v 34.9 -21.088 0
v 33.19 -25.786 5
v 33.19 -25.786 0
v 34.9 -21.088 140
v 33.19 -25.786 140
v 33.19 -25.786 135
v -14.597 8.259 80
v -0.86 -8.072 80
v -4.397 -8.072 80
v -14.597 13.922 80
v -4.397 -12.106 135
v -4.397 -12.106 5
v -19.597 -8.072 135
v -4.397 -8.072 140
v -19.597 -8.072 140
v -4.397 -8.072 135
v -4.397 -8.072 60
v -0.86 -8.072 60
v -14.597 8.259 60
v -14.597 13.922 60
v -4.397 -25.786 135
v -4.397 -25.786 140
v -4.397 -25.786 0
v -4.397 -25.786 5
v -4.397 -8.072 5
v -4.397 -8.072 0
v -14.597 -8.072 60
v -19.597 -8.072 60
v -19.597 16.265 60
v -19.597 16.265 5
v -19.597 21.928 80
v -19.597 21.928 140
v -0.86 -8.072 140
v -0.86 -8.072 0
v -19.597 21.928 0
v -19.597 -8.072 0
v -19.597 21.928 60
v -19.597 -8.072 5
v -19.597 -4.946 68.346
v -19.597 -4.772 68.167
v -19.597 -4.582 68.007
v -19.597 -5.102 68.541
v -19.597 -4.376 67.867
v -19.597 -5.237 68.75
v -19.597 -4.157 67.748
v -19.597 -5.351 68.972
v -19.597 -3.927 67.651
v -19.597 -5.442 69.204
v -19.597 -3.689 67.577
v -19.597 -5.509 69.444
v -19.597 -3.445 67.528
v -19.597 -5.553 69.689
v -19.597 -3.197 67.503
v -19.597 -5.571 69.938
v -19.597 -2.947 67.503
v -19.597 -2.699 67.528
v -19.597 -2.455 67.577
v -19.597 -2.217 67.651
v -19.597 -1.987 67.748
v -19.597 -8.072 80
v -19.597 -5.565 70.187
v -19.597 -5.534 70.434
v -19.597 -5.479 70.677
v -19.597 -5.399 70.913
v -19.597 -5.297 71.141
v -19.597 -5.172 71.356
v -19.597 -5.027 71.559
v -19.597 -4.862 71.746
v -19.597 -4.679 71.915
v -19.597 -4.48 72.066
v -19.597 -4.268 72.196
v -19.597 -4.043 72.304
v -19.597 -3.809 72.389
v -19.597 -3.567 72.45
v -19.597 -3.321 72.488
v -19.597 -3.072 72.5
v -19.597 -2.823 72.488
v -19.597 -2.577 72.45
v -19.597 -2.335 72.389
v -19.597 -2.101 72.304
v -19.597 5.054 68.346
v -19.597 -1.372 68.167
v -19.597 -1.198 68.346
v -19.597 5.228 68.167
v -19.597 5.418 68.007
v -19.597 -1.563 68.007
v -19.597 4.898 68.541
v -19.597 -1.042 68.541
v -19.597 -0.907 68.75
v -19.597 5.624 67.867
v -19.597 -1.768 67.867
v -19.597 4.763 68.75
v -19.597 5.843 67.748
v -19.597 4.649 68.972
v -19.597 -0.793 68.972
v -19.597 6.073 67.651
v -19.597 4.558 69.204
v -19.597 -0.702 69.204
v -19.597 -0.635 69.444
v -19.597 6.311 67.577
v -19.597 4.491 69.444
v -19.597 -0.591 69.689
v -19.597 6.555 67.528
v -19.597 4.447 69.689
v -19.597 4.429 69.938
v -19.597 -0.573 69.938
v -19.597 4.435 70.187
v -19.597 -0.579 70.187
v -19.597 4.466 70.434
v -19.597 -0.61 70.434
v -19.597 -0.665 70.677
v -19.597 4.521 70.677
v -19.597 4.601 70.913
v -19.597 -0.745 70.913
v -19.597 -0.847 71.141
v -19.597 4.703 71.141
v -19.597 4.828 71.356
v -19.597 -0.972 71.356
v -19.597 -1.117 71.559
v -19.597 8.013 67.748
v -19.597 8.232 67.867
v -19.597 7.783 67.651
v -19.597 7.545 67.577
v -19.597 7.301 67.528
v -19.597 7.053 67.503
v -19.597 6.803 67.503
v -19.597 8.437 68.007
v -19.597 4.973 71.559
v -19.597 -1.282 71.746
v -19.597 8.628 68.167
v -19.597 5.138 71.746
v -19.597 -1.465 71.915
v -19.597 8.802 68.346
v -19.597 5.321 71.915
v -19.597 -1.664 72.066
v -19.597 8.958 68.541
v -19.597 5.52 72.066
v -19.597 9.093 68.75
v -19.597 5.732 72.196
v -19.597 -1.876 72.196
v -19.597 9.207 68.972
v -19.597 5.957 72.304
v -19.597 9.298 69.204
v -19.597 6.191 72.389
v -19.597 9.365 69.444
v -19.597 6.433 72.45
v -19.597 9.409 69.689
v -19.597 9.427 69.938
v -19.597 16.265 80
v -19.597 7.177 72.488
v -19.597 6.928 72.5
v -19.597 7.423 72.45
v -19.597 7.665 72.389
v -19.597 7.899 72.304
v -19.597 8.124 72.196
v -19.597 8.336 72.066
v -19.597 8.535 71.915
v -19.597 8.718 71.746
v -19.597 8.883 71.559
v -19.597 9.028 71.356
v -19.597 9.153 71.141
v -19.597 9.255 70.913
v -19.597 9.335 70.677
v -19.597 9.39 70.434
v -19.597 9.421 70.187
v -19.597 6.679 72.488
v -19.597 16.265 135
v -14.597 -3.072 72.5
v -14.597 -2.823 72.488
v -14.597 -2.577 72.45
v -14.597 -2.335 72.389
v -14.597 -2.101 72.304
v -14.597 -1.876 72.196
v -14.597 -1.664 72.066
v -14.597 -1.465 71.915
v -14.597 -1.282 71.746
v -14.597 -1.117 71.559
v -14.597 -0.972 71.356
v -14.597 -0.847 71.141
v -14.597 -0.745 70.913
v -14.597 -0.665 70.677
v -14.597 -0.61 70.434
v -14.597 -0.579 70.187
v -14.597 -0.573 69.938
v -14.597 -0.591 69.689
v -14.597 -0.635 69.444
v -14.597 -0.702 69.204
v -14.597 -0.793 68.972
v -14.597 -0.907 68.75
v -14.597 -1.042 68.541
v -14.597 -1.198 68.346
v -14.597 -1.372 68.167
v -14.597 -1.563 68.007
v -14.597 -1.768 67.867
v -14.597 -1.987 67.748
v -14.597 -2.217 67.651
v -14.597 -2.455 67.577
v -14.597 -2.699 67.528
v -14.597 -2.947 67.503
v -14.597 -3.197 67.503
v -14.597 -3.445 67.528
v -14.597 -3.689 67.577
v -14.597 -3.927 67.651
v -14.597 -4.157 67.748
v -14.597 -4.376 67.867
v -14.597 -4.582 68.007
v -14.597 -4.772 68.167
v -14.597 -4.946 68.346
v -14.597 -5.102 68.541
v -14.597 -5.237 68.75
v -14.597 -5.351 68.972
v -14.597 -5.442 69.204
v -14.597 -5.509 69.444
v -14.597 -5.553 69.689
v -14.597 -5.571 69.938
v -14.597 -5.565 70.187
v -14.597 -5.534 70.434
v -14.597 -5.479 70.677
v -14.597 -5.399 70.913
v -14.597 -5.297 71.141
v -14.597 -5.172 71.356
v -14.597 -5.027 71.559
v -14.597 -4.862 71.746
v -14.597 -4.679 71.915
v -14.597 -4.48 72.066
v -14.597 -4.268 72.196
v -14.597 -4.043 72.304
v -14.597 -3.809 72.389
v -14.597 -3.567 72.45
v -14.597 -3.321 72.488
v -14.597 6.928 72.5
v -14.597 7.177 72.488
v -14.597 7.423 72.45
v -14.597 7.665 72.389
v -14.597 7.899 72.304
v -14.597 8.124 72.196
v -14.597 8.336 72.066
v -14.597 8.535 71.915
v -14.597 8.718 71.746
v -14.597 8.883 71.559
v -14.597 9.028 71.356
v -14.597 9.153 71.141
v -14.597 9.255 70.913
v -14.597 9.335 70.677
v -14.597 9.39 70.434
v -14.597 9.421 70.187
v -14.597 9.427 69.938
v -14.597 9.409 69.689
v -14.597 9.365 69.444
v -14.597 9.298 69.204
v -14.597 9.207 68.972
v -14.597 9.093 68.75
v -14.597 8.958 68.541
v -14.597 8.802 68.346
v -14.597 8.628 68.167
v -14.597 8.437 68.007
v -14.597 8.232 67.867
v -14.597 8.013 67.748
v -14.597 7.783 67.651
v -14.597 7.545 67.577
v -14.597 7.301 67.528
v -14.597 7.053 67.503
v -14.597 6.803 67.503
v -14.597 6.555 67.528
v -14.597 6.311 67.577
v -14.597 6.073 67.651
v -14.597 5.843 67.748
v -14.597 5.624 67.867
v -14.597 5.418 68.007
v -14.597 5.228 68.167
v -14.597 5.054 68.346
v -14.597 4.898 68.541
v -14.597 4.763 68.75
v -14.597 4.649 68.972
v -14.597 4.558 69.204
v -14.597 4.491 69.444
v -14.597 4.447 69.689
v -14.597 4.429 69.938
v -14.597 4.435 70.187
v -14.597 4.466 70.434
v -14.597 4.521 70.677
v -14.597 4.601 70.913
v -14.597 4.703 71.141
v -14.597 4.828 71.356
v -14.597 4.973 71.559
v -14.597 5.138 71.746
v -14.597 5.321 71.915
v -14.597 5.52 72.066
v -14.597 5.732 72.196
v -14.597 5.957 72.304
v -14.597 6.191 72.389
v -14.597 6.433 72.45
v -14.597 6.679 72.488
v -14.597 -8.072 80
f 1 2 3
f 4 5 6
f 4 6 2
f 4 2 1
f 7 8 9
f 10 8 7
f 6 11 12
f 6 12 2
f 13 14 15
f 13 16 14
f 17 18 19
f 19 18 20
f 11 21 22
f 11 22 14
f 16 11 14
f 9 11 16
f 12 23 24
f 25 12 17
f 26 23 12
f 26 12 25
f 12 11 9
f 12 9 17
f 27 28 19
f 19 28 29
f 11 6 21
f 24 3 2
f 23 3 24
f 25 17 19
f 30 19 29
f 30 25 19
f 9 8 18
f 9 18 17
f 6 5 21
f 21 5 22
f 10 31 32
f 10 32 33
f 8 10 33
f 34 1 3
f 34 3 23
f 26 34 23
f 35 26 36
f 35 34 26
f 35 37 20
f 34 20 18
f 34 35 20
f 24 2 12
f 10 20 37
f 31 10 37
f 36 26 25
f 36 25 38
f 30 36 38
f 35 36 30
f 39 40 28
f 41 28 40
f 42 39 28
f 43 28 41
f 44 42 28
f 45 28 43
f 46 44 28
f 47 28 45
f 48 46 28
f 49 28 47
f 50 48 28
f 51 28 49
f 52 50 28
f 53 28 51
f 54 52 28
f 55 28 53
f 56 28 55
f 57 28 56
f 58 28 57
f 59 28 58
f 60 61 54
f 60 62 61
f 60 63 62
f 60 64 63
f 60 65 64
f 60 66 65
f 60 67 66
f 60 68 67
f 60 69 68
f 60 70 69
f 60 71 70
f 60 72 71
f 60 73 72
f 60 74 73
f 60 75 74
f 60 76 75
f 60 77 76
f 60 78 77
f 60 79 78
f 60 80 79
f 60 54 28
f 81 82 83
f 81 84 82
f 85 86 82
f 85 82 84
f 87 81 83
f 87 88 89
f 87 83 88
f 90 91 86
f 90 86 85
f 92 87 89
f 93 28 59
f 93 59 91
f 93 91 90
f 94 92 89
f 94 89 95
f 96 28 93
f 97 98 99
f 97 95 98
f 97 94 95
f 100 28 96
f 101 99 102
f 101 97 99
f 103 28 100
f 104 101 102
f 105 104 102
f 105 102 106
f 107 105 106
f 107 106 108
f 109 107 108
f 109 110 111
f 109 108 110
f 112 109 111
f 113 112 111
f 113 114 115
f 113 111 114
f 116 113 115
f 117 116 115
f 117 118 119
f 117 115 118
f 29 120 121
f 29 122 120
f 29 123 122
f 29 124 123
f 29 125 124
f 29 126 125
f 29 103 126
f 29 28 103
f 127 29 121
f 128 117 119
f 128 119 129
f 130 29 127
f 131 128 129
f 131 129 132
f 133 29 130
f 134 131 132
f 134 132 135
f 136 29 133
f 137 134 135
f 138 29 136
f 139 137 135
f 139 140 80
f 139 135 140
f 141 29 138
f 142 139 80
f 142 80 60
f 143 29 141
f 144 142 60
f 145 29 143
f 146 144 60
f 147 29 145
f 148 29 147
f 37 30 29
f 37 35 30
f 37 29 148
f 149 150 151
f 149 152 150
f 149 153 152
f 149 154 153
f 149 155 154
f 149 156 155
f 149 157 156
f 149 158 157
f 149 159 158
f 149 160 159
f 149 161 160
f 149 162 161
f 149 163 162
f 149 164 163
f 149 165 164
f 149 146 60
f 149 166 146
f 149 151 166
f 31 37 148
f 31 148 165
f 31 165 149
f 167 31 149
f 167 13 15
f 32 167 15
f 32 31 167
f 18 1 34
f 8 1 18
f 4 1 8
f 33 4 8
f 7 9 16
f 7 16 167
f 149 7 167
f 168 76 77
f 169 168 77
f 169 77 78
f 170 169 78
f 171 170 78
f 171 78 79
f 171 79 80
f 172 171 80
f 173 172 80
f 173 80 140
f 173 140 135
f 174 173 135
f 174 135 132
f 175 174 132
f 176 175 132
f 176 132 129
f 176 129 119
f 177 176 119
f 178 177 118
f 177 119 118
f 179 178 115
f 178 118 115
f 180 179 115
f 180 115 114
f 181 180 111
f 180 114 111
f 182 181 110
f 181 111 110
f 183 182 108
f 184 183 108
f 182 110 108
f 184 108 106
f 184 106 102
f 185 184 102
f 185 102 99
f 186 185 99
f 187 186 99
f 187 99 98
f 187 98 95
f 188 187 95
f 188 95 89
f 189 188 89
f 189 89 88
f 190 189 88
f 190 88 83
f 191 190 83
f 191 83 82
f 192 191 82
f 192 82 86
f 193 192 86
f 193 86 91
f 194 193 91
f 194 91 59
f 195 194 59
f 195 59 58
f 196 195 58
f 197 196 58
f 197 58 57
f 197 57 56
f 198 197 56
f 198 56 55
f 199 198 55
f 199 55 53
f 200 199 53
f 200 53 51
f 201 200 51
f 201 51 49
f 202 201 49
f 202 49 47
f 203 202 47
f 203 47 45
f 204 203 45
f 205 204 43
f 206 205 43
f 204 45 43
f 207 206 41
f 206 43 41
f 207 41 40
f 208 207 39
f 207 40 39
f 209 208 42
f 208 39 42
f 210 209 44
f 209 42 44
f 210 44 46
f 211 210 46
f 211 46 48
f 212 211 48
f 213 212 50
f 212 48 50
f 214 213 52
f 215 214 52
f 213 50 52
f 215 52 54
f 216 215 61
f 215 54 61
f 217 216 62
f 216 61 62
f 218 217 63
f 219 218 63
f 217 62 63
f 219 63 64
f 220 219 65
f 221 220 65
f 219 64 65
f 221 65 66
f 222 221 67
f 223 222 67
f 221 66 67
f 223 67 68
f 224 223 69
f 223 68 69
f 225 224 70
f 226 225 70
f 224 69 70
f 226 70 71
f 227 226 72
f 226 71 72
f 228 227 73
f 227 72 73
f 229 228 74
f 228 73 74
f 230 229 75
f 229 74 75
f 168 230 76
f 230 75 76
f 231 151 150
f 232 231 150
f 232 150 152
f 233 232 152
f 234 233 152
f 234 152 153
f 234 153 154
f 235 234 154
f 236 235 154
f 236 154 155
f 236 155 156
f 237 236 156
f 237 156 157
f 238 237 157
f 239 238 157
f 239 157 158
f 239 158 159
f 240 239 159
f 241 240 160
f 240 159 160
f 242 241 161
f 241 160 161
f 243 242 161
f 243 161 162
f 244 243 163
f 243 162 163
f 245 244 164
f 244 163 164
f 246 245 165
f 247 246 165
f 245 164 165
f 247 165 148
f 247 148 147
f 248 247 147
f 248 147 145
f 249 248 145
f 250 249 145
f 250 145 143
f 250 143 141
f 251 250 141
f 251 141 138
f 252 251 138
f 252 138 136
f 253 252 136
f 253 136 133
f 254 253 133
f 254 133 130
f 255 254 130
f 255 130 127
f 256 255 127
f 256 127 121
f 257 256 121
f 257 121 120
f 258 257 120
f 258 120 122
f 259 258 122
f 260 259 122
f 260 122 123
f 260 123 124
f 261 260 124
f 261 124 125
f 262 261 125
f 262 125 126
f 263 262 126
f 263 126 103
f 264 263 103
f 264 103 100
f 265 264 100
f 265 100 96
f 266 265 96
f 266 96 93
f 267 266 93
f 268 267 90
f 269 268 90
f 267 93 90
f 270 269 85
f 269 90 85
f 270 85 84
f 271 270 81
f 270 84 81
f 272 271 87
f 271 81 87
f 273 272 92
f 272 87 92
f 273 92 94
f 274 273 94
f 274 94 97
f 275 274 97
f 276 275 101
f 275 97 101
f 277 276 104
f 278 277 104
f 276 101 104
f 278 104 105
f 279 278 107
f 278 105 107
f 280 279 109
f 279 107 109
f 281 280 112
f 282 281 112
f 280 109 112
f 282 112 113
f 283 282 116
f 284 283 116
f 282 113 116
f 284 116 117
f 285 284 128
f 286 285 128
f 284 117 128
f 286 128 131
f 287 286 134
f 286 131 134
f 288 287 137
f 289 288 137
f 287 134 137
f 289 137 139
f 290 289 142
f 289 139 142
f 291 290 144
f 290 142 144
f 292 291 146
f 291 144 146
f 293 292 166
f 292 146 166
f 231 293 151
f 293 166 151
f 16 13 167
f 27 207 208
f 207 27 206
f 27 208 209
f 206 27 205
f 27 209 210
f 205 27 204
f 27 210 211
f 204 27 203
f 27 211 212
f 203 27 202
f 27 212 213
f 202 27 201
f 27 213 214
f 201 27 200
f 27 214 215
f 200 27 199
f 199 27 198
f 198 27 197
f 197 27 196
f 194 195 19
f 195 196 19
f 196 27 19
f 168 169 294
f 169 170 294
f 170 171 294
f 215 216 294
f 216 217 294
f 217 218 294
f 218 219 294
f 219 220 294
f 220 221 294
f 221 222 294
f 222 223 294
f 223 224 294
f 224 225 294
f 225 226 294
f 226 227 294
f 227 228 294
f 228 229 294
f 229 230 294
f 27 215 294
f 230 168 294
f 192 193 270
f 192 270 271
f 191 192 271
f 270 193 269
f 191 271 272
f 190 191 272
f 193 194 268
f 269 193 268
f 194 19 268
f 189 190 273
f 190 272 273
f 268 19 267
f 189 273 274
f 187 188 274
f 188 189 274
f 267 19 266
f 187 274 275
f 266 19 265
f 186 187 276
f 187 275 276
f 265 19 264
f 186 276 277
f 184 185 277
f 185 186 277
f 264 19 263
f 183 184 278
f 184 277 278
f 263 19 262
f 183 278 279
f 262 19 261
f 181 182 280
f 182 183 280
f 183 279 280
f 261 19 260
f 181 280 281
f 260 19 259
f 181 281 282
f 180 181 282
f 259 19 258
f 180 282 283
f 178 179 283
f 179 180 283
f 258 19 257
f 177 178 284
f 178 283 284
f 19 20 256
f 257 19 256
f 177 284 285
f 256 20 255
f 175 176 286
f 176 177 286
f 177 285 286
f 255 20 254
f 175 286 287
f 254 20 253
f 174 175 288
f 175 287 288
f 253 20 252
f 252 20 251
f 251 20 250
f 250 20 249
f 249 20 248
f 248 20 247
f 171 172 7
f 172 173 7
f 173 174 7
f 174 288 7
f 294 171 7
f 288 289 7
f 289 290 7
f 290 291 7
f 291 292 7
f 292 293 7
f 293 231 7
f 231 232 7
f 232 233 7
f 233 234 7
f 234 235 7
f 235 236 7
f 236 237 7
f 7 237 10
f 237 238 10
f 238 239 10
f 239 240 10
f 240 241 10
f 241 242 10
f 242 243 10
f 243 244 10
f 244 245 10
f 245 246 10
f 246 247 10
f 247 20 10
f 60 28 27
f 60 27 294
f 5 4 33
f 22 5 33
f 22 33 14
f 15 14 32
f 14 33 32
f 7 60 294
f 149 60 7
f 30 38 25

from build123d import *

# Parameters (mm, degrees)
EXTRUDE_1_DEPTH      = 5
EXTRUDE_2_DEPTH      = 135
EXTRUDE_2_DEPTH_BACK = 5
SKETCH_3_W           = 20
SKETCH_3_H           = 35.370571237
CUT_EXTRUDE_1_DEPTH  = 135
SKETCH_4_W           = 20
SKETCH_4_H           = 30
EXTRUDE_3_DEPTH      = 5
CUT_EXTRUDE_2_DEPTH  = 78
SKETCH_6_R           = 2.5
CUT_EXTRUDE_3_DEPTH  = 78
EXTRUDE_4_DEPTH      = 5
EXTRUDE_5_DEPTH      = 140
EXTRUDE_6_DEPTH      = 5
EXTRUDE_7_DEPTH      = 5


with BuildPart() as part:
    # 스케치1 → 보스-돌출1 (new body)
    with BuildSketch(Plane.XY):
        Polygon((-19.597361035, 21.927954703), (-19.597361035, -8.072045297), (-4.397361035, -8.072045297), align=None)
    extrude(amount=EXTRUDE_1_DEPTH)

    # 스케치2 → 보스-돌출2 (add, two sides: drawn at the far end of the back side and taken through both)
    with BuildSketch(Plane.XY.offset(5).offset(-EXTRUDE_2_DEPTH_BACK)):
        Polygon((-19.597361035, 21.927954703), (-0.860303912, -8.072045297), (-4.397361035, -8.072045297), (-19.597361035, 16.264754072), align=None)
    extrude(amount=EXTRUDE_2_DEPTH + EXTRUDE_2_DEPTH_BACK)

    # 스케치3 → 컷-돌출1 (cut)
    with BuildSketch(Plane(origin=(-4.245672665, -2.651713709, 0), x_dir=(0, 0, -1), z_dir=(0.8481627225827804, 0.5297357794419456, 0))):
        with Locations((-70, 11.294611466)):
            Rectangle(SKETCH_3_W, SKETCH_3_H)
    extrude(amount=-CUT_EXTRUDE_1_DEPTH, mode=Mode.SUBTRACT)


with BuildPart() as cut_extrude_1_piece_1:
    # of the separate pieces the step leaves, piece 1, a body of its own (cut_extrude_1_pieces)
    add(part.part.solids().sort_by_distance((-19.597361035, 21.927954703, 0))[0])



with BuildPart() as cut_extrude_1_piece_2:
    # of the separate pieces the step leaves, piece 2, a body of its own (cut_extrude_1_pieces)
    add(part.part.solids().sort_by_distance((-19.597361035, 16.264754072, 80))[0])


with BuildPart() as cut_extrude_1_piece_1_1:
    add(cut_extrude_1_piece_1.part)

    add(cut_extrude_1_piece_2.part)  # 보스-돌출3 merges 컷-돌출1 piece 2
    # 스케치4 → 보스-돌출3 (add)
    with BuildSketch(Plane.ZY.offset(19.597361035)):
        with Locations((70, 6.927954703)):
            Rectangle(SKETCH_4_W, SKETCH_4_H)
    extrude(amount=-EXTRUDE_3_DEPTH)

    # 스케치5 → 컷-돌출2 (cut)
    with BuildSketch(Plane.XY.offset(80)):
        Polygon((-19.597361035, 21.927954703), (-14.597361035, 21.927954703), (-14.597361035, 13.922428594), align=None)
    extrude(amount=-CUT_EXTRUDE_2_DEPTH, mode=Mode.SUBTRACT)

    # 스케치6 → 컷-돌출3 (cut)
    with BuildSketch(Plane.ZY.offset(19.597361035)):
        with Locations((70, -3.072045297)):
            Circle(SKETCH_6_R)
        with Locations((70, 6.927954703)):
            Circle(SKETCH_6_R)
    extrude(amount=-CUT_EXTRUDE_3_DEPTH, mode=Mode.SUBTRACT)

    # 스케치7 → 보스-돌출4 (add)
    with BuildSketch(Plane.XY.offset(140)):
        Polygon((-0.860303912, -8.072045297), (-19.597361035, 21.927954703), (-19.597361035, -8.072045297), align=None)
    extrude(amount=-EXTRUDE_4_DEPTH)

    # 스케치8 → 보스-돌출5 (add)
    with BuildSketch(Plane.XY.offset(140)):
        Polygon((34.900444513, -21.087893279), (-0.860303912, -8.072045297), (-4.397361035, -8.072045297), (-4.397361035, -12.10555065), (33.190343796, -25.786356383), align=None)
    extrude(amount=-EXTRUDE_5_DEPTH)

    # 스케치9 → 보스-돌출6 (add)
    with BuildSketch(Plane.XY.offset(140)):
        Polygon((33.190343796, -25.786356383), (-4.397361035, -25.786356383), (-4.397361035, -8.072045297), align=None)
    extrude(amount=-EXTRUDE_6_DEPTH)

    # 스케치10 → 보스-돌출7 (add)
    with BuildSketch(Plane(origin=(0, 0, 0), x_dir=(-1, 0, 0), z_dir=(0, 0, -1))):
        Polygon((-33.190343796, -25.786356383), (4.397361035, -25.786356383), (4.397361035, -10.088797974), align=None)
    extrude(amount=-EXTRUDE_7_DEPTH)


solid = cut_extrude_1_piece_1_1.part
